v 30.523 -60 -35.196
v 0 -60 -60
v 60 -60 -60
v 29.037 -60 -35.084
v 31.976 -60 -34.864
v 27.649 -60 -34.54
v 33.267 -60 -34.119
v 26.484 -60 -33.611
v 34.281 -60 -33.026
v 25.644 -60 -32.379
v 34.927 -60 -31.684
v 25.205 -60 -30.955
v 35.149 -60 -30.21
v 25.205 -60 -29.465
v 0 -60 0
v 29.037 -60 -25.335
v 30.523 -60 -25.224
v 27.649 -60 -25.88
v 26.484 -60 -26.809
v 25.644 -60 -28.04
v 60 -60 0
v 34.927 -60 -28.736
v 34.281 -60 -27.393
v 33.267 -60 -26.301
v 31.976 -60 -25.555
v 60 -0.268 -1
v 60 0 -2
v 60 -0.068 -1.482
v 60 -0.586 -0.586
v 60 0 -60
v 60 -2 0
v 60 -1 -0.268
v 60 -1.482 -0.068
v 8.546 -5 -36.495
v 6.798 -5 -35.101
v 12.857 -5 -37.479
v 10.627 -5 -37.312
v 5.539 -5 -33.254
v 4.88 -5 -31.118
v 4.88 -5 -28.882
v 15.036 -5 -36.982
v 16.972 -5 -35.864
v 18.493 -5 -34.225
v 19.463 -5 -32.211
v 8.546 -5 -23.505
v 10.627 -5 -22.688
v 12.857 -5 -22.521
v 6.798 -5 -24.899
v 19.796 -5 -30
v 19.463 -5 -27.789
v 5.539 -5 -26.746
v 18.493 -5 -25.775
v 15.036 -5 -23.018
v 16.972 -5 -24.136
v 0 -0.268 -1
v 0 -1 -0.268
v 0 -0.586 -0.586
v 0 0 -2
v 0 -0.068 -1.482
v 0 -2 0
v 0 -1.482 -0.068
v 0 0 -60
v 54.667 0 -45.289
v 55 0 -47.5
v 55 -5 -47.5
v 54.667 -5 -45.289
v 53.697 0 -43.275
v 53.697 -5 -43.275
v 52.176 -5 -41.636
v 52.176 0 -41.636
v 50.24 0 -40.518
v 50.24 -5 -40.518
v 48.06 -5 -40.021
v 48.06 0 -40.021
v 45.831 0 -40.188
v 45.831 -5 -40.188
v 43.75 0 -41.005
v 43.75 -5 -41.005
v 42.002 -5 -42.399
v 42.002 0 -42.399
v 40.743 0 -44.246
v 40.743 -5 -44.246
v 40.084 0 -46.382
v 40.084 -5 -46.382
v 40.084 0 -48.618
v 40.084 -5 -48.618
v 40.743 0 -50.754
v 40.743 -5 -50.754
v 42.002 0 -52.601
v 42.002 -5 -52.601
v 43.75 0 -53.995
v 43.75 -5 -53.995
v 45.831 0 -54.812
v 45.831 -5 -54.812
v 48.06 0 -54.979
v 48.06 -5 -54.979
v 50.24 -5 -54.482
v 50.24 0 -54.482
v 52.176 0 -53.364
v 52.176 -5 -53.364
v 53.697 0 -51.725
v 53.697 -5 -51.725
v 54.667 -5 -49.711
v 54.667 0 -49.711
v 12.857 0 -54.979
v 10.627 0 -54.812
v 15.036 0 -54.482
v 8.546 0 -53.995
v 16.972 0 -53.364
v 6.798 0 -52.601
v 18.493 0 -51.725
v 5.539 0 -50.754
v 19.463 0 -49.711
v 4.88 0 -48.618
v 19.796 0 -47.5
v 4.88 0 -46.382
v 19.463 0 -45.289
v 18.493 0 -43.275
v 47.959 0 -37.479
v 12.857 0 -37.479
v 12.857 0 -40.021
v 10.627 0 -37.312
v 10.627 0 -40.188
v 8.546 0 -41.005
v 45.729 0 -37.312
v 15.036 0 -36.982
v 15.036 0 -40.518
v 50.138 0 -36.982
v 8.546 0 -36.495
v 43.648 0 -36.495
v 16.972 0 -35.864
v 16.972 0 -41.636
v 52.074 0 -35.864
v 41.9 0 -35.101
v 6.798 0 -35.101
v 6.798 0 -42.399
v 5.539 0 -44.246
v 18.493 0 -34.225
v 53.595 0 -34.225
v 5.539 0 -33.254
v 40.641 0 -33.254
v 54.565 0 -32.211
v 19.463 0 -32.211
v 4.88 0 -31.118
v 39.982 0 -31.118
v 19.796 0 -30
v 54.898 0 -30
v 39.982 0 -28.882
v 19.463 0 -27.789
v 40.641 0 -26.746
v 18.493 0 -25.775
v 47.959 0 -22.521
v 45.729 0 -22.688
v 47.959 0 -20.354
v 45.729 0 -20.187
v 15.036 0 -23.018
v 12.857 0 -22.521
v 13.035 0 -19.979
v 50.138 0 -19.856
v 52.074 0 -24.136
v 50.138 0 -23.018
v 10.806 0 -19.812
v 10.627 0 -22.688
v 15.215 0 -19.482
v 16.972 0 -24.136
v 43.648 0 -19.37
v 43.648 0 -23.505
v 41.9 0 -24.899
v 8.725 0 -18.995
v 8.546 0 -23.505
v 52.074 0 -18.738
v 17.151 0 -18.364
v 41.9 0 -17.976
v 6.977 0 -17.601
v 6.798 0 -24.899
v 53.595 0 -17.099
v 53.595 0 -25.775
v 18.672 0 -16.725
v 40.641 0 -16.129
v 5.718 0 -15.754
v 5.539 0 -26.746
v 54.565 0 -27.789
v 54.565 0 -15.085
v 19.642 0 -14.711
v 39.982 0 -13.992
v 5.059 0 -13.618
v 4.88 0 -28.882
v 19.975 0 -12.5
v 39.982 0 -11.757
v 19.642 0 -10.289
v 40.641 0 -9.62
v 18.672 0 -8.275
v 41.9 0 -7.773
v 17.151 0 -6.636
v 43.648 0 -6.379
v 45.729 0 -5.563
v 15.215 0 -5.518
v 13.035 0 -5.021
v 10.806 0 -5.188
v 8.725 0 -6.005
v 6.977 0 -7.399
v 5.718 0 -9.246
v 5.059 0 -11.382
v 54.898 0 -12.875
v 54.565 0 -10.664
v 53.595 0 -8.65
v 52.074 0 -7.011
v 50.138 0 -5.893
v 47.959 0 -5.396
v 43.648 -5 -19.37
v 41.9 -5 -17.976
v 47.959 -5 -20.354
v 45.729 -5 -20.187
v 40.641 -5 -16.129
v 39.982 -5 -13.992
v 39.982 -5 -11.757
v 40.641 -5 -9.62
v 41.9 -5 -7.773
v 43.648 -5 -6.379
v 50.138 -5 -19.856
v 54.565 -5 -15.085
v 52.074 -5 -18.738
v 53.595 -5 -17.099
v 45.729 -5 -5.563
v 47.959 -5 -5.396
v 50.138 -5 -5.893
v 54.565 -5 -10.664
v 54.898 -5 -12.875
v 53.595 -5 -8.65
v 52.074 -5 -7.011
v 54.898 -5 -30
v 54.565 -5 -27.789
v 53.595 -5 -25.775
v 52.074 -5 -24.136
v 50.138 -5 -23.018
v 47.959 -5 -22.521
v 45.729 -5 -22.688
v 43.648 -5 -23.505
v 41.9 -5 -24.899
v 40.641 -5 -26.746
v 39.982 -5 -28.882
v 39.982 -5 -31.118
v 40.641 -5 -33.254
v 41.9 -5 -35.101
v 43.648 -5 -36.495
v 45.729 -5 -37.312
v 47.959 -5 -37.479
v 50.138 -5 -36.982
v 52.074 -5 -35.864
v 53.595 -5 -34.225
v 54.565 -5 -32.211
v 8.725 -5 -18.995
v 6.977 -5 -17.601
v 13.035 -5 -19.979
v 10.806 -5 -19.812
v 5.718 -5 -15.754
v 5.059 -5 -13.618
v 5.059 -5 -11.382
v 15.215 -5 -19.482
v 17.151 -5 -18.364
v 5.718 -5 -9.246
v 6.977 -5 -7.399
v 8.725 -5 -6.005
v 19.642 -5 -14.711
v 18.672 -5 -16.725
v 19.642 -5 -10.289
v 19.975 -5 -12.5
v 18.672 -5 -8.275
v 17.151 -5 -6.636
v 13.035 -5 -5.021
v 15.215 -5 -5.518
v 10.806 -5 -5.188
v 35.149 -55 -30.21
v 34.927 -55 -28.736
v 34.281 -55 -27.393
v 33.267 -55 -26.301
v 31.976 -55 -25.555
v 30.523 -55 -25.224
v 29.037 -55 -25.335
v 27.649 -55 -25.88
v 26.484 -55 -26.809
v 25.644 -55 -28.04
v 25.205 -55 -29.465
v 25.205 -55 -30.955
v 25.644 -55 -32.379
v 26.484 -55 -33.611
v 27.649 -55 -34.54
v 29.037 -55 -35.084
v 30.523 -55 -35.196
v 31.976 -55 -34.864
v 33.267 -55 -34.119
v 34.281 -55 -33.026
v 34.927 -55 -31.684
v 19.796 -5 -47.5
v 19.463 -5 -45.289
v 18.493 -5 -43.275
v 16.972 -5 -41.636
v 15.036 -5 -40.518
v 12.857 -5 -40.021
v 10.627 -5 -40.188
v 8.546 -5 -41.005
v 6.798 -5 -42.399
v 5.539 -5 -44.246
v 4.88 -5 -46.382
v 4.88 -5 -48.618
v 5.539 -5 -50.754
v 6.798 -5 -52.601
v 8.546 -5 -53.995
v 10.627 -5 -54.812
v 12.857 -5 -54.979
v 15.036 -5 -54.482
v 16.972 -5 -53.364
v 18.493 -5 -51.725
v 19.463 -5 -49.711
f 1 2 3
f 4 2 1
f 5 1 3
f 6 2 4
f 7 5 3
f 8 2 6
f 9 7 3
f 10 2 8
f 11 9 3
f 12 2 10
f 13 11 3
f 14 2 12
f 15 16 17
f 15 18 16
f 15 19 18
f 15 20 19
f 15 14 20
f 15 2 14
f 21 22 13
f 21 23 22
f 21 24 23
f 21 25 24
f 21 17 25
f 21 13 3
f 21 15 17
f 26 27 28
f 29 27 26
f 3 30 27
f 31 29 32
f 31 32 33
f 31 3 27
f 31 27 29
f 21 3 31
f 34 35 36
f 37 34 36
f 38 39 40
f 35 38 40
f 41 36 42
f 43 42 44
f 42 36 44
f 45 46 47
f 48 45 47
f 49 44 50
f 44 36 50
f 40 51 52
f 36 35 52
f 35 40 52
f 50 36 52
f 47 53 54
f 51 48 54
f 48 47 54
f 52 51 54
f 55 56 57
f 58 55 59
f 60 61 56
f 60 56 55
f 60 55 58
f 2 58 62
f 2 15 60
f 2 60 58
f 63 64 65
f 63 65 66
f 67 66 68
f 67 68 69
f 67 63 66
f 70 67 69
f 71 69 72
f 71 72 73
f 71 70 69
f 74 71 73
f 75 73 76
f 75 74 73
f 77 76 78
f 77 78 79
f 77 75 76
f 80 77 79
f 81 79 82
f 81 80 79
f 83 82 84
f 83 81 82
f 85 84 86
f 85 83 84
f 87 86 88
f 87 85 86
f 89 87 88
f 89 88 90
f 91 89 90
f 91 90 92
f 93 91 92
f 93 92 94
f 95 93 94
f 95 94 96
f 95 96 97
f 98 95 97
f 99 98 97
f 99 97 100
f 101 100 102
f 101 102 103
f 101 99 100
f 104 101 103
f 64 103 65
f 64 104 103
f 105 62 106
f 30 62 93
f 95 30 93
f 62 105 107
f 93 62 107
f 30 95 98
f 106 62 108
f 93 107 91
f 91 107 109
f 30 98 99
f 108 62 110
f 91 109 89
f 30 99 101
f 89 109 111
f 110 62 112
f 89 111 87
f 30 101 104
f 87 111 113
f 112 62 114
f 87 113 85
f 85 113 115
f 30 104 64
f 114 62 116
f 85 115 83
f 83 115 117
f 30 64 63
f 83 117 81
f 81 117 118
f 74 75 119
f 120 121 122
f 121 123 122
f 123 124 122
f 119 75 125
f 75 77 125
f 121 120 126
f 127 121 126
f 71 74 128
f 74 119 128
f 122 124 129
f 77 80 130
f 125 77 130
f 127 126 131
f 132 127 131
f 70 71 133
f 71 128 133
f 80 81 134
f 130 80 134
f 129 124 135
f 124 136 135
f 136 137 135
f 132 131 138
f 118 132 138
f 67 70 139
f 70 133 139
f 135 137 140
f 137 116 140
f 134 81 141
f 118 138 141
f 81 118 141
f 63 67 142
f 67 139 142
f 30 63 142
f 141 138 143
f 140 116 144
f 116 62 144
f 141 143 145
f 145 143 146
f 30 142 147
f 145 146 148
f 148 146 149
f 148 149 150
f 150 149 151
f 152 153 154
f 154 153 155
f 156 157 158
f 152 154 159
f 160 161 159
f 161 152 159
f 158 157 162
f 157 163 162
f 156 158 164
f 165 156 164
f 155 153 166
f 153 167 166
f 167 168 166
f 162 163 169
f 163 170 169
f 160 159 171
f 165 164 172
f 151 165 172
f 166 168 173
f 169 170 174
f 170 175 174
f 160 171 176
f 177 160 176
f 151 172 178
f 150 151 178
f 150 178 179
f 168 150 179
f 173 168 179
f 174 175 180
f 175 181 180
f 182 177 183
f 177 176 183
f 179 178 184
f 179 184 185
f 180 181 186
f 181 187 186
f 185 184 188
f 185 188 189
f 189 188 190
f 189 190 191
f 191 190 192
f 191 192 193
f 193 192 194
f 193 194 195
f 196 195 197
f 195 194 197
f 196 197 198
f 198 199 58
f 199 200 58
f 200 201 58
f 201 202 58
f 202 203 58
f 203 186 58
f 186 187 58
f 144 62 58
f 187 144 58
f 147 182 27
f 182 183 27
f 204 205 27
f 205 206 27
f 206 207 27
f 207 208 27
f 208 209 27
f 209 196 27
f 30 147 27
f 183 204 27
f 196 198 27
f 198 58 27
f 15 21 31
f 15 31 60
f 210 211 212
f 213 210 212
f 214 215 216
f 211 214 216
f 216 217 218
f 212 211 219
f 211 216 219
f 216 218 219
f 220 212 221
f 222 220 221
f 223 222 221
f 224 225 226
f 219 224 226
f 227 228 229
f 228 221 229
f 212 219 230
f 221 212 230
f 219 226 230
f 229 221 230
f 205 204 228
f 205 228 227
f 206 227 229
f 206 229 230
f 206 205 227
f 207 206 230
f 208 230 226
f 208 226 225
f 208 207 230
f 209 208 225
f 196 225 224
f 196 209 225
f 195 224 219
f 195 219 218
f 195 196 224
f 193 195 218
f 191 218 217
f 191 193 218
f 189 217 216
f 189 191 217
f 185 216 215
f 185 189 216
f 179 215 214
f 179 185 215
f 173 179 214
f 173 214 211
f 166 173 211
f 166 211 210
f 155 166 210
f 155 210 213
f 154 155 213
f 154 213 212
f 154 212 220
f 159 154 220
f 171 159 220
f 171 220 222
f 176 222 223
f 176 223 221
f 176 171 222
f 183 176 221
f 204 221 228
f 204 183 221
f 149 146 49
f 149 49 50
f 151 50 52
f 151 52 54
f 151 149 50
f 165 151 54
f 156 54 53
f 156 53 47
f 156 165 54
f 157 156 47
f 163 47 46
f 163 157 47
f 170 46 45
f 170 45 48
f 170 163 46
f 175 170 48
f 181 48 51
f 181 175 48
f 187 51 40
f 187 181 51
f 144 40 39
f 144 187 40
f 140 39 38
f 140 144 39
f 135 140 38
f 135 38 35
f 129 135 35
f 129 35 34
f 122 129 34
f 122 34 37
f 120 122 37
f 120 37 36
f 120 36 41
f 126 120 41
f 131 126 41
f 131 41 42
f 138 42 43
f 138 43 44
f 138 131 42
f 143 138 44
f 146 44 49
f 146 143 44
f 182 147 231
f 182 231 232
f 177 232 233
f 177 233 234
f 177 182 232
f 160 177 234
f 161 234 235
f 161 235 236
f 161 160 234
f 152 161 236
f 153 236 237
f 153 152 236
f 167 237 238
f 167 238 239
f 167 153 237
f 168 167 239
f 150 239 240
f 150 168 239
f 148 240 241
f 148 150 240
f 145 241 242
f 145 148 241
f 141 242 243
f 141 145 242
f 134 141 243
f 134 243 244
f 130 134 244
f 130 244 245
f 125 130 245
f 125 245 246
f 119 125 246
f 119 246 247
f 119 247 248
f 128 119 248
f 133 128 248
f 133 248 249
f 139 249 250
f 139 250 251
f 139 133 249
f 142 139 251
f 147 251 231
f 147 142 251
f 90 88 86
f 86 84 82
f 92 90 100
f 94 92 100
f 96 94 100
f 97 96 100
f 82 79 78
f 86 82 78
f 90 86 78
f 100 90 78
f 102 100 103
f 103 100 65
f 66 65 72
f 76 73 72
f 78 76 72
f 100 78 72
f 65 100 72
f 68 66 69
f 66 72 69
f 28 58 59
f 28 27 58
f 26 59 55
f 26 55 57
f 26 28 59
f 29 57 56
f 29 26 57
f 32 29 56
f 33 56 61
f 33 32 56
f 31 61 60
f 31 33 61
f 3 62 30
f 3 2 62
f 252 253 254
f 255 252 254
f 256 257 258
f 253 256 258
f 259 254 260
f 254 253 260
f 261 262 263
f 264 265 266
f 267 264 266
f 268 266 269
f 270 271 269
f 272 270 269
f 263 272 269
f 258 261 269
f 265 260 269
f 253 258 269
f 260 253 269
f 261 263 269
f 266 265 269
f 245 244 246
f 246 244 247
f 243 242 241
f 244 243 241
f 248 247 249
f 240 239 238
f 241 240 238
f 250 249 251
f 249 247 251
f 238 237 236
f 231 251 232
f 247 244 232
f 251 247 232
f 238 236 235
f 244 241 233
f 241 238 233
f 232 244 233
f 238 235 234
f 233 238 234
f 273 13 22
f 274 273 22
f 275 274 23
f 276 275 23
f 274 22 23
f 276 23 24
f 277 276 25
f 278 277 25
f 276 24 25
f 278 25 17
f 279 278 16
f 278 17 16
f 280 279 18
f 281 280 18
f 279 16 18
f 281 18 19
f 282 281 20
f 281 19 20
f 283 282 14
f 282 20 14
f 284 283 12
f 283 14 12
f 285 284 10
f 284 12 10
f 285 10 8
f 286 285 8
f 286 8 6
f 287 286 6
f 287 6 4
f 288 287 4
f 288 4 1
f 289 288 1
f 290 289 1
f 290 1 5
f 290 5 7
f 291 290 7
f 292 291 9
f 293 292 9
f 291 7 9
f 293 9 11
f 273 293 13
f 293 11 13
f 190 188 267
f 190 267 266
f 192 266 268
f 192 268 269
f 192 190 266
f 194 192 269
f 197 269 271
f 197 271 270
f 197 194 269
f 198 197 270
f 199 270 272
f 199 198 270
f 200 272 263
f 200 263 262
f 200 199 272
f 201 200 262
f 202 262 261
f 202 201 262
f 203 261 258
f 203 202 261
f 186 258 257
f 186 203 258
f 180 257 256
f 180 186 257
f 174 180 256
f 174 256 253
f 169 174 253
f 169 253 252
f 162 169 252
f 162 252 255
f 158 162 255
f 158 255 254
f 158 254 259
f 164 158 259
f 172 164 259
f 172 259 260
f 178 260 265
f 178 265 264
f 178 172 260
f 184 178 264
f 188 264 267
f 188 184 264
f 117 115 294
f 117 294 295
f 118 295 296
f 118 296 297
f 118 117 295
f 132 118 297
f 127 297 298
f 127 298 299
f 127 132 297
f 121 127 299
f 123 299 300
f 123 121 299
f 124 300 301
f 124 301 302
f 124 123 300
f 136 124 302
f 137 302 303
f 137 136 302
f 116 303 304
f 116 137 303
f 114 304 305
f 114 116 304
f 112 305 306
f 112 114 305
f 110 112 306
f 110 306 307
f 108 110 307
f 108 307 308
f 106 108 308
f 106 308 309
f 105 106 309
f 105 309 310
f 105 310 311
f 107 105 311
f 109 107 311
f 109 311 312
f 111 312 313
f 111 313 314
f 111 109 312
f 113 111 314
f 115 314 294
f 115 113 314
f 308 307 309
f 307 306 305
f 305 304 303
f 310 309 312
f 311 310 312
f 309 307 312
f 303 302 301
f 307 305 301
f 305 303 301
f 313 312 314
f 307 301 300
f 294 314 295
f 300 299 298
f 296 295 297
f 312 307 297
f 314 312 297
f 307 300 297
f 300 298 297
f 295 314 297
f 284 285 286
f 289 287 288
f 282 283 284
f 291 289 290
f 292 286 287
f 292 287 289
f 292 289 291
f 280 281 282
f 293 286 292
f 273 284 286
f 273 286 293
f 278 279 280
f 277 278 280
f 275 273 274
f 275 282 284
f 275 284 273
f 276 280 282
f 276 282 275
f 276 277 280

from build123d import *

# Parameters (mm, degrees)
F0_W     = 60
F0_H     = 60
F2_W     = 60
F2_H     = 60
F5_R     = 5
F6_DEPTH = 5
F7_R     = 7.5
F8_DEPTH = 5
F9_R     = 2


with BuildPart() as f3:
    # F0 (on Front) → F3 section 0
    with BuildSketch(Plane.XZ):
        with Locations((30, -30)):
            Rectangle(F0_W, F0_H)
    # F2 (on offset) → F3 section 1
    with BuildSketch(Plane.XZ.offset(60)):
        with Locations((30, -30)):
            Rectangle(F2_W, F2_H)
    loft()

    # F5 (on offset) → F6 (cut)
    with BuildSketch(Plane.XZ.offset(60)):
        with Locations((30.1493108273, -30.2097292106)):
            Circle(F5_R)
    extrude(amount=-F6_DEPTH, mode=Mode.SUBTRACT)

    # F7 (on Front) → F8 (cut)
    with BuildSketch(Plane.XZ):
        with Locations((47.3982296399, -12.8745916897)):
            Circle(F7_R)
        with Locations((12.4750004448, -12.5)):
            Circle(F7_R)
        with Locations((47.3982296399, -30)):
            Circle(F7_R)
        with Locations((12.2961504385, -30)):
            Circle(F7_R)
        with Locations((47.5, -47.5)):
            Circle(F7_R)
        with Locations((12.2961504385, -47.5)):
            Circle(F7_R)
    extrude(amount=F8_DEPTH, mode=Mode.SUBTRACT)

    # F9
    f9_edges = [f3.edges().sort_by_distance(p)[0] for p in [
        (30, 0, 0),
    ]]
    fillet(f9_edges, radius=F9_R)


solid = f3.part
